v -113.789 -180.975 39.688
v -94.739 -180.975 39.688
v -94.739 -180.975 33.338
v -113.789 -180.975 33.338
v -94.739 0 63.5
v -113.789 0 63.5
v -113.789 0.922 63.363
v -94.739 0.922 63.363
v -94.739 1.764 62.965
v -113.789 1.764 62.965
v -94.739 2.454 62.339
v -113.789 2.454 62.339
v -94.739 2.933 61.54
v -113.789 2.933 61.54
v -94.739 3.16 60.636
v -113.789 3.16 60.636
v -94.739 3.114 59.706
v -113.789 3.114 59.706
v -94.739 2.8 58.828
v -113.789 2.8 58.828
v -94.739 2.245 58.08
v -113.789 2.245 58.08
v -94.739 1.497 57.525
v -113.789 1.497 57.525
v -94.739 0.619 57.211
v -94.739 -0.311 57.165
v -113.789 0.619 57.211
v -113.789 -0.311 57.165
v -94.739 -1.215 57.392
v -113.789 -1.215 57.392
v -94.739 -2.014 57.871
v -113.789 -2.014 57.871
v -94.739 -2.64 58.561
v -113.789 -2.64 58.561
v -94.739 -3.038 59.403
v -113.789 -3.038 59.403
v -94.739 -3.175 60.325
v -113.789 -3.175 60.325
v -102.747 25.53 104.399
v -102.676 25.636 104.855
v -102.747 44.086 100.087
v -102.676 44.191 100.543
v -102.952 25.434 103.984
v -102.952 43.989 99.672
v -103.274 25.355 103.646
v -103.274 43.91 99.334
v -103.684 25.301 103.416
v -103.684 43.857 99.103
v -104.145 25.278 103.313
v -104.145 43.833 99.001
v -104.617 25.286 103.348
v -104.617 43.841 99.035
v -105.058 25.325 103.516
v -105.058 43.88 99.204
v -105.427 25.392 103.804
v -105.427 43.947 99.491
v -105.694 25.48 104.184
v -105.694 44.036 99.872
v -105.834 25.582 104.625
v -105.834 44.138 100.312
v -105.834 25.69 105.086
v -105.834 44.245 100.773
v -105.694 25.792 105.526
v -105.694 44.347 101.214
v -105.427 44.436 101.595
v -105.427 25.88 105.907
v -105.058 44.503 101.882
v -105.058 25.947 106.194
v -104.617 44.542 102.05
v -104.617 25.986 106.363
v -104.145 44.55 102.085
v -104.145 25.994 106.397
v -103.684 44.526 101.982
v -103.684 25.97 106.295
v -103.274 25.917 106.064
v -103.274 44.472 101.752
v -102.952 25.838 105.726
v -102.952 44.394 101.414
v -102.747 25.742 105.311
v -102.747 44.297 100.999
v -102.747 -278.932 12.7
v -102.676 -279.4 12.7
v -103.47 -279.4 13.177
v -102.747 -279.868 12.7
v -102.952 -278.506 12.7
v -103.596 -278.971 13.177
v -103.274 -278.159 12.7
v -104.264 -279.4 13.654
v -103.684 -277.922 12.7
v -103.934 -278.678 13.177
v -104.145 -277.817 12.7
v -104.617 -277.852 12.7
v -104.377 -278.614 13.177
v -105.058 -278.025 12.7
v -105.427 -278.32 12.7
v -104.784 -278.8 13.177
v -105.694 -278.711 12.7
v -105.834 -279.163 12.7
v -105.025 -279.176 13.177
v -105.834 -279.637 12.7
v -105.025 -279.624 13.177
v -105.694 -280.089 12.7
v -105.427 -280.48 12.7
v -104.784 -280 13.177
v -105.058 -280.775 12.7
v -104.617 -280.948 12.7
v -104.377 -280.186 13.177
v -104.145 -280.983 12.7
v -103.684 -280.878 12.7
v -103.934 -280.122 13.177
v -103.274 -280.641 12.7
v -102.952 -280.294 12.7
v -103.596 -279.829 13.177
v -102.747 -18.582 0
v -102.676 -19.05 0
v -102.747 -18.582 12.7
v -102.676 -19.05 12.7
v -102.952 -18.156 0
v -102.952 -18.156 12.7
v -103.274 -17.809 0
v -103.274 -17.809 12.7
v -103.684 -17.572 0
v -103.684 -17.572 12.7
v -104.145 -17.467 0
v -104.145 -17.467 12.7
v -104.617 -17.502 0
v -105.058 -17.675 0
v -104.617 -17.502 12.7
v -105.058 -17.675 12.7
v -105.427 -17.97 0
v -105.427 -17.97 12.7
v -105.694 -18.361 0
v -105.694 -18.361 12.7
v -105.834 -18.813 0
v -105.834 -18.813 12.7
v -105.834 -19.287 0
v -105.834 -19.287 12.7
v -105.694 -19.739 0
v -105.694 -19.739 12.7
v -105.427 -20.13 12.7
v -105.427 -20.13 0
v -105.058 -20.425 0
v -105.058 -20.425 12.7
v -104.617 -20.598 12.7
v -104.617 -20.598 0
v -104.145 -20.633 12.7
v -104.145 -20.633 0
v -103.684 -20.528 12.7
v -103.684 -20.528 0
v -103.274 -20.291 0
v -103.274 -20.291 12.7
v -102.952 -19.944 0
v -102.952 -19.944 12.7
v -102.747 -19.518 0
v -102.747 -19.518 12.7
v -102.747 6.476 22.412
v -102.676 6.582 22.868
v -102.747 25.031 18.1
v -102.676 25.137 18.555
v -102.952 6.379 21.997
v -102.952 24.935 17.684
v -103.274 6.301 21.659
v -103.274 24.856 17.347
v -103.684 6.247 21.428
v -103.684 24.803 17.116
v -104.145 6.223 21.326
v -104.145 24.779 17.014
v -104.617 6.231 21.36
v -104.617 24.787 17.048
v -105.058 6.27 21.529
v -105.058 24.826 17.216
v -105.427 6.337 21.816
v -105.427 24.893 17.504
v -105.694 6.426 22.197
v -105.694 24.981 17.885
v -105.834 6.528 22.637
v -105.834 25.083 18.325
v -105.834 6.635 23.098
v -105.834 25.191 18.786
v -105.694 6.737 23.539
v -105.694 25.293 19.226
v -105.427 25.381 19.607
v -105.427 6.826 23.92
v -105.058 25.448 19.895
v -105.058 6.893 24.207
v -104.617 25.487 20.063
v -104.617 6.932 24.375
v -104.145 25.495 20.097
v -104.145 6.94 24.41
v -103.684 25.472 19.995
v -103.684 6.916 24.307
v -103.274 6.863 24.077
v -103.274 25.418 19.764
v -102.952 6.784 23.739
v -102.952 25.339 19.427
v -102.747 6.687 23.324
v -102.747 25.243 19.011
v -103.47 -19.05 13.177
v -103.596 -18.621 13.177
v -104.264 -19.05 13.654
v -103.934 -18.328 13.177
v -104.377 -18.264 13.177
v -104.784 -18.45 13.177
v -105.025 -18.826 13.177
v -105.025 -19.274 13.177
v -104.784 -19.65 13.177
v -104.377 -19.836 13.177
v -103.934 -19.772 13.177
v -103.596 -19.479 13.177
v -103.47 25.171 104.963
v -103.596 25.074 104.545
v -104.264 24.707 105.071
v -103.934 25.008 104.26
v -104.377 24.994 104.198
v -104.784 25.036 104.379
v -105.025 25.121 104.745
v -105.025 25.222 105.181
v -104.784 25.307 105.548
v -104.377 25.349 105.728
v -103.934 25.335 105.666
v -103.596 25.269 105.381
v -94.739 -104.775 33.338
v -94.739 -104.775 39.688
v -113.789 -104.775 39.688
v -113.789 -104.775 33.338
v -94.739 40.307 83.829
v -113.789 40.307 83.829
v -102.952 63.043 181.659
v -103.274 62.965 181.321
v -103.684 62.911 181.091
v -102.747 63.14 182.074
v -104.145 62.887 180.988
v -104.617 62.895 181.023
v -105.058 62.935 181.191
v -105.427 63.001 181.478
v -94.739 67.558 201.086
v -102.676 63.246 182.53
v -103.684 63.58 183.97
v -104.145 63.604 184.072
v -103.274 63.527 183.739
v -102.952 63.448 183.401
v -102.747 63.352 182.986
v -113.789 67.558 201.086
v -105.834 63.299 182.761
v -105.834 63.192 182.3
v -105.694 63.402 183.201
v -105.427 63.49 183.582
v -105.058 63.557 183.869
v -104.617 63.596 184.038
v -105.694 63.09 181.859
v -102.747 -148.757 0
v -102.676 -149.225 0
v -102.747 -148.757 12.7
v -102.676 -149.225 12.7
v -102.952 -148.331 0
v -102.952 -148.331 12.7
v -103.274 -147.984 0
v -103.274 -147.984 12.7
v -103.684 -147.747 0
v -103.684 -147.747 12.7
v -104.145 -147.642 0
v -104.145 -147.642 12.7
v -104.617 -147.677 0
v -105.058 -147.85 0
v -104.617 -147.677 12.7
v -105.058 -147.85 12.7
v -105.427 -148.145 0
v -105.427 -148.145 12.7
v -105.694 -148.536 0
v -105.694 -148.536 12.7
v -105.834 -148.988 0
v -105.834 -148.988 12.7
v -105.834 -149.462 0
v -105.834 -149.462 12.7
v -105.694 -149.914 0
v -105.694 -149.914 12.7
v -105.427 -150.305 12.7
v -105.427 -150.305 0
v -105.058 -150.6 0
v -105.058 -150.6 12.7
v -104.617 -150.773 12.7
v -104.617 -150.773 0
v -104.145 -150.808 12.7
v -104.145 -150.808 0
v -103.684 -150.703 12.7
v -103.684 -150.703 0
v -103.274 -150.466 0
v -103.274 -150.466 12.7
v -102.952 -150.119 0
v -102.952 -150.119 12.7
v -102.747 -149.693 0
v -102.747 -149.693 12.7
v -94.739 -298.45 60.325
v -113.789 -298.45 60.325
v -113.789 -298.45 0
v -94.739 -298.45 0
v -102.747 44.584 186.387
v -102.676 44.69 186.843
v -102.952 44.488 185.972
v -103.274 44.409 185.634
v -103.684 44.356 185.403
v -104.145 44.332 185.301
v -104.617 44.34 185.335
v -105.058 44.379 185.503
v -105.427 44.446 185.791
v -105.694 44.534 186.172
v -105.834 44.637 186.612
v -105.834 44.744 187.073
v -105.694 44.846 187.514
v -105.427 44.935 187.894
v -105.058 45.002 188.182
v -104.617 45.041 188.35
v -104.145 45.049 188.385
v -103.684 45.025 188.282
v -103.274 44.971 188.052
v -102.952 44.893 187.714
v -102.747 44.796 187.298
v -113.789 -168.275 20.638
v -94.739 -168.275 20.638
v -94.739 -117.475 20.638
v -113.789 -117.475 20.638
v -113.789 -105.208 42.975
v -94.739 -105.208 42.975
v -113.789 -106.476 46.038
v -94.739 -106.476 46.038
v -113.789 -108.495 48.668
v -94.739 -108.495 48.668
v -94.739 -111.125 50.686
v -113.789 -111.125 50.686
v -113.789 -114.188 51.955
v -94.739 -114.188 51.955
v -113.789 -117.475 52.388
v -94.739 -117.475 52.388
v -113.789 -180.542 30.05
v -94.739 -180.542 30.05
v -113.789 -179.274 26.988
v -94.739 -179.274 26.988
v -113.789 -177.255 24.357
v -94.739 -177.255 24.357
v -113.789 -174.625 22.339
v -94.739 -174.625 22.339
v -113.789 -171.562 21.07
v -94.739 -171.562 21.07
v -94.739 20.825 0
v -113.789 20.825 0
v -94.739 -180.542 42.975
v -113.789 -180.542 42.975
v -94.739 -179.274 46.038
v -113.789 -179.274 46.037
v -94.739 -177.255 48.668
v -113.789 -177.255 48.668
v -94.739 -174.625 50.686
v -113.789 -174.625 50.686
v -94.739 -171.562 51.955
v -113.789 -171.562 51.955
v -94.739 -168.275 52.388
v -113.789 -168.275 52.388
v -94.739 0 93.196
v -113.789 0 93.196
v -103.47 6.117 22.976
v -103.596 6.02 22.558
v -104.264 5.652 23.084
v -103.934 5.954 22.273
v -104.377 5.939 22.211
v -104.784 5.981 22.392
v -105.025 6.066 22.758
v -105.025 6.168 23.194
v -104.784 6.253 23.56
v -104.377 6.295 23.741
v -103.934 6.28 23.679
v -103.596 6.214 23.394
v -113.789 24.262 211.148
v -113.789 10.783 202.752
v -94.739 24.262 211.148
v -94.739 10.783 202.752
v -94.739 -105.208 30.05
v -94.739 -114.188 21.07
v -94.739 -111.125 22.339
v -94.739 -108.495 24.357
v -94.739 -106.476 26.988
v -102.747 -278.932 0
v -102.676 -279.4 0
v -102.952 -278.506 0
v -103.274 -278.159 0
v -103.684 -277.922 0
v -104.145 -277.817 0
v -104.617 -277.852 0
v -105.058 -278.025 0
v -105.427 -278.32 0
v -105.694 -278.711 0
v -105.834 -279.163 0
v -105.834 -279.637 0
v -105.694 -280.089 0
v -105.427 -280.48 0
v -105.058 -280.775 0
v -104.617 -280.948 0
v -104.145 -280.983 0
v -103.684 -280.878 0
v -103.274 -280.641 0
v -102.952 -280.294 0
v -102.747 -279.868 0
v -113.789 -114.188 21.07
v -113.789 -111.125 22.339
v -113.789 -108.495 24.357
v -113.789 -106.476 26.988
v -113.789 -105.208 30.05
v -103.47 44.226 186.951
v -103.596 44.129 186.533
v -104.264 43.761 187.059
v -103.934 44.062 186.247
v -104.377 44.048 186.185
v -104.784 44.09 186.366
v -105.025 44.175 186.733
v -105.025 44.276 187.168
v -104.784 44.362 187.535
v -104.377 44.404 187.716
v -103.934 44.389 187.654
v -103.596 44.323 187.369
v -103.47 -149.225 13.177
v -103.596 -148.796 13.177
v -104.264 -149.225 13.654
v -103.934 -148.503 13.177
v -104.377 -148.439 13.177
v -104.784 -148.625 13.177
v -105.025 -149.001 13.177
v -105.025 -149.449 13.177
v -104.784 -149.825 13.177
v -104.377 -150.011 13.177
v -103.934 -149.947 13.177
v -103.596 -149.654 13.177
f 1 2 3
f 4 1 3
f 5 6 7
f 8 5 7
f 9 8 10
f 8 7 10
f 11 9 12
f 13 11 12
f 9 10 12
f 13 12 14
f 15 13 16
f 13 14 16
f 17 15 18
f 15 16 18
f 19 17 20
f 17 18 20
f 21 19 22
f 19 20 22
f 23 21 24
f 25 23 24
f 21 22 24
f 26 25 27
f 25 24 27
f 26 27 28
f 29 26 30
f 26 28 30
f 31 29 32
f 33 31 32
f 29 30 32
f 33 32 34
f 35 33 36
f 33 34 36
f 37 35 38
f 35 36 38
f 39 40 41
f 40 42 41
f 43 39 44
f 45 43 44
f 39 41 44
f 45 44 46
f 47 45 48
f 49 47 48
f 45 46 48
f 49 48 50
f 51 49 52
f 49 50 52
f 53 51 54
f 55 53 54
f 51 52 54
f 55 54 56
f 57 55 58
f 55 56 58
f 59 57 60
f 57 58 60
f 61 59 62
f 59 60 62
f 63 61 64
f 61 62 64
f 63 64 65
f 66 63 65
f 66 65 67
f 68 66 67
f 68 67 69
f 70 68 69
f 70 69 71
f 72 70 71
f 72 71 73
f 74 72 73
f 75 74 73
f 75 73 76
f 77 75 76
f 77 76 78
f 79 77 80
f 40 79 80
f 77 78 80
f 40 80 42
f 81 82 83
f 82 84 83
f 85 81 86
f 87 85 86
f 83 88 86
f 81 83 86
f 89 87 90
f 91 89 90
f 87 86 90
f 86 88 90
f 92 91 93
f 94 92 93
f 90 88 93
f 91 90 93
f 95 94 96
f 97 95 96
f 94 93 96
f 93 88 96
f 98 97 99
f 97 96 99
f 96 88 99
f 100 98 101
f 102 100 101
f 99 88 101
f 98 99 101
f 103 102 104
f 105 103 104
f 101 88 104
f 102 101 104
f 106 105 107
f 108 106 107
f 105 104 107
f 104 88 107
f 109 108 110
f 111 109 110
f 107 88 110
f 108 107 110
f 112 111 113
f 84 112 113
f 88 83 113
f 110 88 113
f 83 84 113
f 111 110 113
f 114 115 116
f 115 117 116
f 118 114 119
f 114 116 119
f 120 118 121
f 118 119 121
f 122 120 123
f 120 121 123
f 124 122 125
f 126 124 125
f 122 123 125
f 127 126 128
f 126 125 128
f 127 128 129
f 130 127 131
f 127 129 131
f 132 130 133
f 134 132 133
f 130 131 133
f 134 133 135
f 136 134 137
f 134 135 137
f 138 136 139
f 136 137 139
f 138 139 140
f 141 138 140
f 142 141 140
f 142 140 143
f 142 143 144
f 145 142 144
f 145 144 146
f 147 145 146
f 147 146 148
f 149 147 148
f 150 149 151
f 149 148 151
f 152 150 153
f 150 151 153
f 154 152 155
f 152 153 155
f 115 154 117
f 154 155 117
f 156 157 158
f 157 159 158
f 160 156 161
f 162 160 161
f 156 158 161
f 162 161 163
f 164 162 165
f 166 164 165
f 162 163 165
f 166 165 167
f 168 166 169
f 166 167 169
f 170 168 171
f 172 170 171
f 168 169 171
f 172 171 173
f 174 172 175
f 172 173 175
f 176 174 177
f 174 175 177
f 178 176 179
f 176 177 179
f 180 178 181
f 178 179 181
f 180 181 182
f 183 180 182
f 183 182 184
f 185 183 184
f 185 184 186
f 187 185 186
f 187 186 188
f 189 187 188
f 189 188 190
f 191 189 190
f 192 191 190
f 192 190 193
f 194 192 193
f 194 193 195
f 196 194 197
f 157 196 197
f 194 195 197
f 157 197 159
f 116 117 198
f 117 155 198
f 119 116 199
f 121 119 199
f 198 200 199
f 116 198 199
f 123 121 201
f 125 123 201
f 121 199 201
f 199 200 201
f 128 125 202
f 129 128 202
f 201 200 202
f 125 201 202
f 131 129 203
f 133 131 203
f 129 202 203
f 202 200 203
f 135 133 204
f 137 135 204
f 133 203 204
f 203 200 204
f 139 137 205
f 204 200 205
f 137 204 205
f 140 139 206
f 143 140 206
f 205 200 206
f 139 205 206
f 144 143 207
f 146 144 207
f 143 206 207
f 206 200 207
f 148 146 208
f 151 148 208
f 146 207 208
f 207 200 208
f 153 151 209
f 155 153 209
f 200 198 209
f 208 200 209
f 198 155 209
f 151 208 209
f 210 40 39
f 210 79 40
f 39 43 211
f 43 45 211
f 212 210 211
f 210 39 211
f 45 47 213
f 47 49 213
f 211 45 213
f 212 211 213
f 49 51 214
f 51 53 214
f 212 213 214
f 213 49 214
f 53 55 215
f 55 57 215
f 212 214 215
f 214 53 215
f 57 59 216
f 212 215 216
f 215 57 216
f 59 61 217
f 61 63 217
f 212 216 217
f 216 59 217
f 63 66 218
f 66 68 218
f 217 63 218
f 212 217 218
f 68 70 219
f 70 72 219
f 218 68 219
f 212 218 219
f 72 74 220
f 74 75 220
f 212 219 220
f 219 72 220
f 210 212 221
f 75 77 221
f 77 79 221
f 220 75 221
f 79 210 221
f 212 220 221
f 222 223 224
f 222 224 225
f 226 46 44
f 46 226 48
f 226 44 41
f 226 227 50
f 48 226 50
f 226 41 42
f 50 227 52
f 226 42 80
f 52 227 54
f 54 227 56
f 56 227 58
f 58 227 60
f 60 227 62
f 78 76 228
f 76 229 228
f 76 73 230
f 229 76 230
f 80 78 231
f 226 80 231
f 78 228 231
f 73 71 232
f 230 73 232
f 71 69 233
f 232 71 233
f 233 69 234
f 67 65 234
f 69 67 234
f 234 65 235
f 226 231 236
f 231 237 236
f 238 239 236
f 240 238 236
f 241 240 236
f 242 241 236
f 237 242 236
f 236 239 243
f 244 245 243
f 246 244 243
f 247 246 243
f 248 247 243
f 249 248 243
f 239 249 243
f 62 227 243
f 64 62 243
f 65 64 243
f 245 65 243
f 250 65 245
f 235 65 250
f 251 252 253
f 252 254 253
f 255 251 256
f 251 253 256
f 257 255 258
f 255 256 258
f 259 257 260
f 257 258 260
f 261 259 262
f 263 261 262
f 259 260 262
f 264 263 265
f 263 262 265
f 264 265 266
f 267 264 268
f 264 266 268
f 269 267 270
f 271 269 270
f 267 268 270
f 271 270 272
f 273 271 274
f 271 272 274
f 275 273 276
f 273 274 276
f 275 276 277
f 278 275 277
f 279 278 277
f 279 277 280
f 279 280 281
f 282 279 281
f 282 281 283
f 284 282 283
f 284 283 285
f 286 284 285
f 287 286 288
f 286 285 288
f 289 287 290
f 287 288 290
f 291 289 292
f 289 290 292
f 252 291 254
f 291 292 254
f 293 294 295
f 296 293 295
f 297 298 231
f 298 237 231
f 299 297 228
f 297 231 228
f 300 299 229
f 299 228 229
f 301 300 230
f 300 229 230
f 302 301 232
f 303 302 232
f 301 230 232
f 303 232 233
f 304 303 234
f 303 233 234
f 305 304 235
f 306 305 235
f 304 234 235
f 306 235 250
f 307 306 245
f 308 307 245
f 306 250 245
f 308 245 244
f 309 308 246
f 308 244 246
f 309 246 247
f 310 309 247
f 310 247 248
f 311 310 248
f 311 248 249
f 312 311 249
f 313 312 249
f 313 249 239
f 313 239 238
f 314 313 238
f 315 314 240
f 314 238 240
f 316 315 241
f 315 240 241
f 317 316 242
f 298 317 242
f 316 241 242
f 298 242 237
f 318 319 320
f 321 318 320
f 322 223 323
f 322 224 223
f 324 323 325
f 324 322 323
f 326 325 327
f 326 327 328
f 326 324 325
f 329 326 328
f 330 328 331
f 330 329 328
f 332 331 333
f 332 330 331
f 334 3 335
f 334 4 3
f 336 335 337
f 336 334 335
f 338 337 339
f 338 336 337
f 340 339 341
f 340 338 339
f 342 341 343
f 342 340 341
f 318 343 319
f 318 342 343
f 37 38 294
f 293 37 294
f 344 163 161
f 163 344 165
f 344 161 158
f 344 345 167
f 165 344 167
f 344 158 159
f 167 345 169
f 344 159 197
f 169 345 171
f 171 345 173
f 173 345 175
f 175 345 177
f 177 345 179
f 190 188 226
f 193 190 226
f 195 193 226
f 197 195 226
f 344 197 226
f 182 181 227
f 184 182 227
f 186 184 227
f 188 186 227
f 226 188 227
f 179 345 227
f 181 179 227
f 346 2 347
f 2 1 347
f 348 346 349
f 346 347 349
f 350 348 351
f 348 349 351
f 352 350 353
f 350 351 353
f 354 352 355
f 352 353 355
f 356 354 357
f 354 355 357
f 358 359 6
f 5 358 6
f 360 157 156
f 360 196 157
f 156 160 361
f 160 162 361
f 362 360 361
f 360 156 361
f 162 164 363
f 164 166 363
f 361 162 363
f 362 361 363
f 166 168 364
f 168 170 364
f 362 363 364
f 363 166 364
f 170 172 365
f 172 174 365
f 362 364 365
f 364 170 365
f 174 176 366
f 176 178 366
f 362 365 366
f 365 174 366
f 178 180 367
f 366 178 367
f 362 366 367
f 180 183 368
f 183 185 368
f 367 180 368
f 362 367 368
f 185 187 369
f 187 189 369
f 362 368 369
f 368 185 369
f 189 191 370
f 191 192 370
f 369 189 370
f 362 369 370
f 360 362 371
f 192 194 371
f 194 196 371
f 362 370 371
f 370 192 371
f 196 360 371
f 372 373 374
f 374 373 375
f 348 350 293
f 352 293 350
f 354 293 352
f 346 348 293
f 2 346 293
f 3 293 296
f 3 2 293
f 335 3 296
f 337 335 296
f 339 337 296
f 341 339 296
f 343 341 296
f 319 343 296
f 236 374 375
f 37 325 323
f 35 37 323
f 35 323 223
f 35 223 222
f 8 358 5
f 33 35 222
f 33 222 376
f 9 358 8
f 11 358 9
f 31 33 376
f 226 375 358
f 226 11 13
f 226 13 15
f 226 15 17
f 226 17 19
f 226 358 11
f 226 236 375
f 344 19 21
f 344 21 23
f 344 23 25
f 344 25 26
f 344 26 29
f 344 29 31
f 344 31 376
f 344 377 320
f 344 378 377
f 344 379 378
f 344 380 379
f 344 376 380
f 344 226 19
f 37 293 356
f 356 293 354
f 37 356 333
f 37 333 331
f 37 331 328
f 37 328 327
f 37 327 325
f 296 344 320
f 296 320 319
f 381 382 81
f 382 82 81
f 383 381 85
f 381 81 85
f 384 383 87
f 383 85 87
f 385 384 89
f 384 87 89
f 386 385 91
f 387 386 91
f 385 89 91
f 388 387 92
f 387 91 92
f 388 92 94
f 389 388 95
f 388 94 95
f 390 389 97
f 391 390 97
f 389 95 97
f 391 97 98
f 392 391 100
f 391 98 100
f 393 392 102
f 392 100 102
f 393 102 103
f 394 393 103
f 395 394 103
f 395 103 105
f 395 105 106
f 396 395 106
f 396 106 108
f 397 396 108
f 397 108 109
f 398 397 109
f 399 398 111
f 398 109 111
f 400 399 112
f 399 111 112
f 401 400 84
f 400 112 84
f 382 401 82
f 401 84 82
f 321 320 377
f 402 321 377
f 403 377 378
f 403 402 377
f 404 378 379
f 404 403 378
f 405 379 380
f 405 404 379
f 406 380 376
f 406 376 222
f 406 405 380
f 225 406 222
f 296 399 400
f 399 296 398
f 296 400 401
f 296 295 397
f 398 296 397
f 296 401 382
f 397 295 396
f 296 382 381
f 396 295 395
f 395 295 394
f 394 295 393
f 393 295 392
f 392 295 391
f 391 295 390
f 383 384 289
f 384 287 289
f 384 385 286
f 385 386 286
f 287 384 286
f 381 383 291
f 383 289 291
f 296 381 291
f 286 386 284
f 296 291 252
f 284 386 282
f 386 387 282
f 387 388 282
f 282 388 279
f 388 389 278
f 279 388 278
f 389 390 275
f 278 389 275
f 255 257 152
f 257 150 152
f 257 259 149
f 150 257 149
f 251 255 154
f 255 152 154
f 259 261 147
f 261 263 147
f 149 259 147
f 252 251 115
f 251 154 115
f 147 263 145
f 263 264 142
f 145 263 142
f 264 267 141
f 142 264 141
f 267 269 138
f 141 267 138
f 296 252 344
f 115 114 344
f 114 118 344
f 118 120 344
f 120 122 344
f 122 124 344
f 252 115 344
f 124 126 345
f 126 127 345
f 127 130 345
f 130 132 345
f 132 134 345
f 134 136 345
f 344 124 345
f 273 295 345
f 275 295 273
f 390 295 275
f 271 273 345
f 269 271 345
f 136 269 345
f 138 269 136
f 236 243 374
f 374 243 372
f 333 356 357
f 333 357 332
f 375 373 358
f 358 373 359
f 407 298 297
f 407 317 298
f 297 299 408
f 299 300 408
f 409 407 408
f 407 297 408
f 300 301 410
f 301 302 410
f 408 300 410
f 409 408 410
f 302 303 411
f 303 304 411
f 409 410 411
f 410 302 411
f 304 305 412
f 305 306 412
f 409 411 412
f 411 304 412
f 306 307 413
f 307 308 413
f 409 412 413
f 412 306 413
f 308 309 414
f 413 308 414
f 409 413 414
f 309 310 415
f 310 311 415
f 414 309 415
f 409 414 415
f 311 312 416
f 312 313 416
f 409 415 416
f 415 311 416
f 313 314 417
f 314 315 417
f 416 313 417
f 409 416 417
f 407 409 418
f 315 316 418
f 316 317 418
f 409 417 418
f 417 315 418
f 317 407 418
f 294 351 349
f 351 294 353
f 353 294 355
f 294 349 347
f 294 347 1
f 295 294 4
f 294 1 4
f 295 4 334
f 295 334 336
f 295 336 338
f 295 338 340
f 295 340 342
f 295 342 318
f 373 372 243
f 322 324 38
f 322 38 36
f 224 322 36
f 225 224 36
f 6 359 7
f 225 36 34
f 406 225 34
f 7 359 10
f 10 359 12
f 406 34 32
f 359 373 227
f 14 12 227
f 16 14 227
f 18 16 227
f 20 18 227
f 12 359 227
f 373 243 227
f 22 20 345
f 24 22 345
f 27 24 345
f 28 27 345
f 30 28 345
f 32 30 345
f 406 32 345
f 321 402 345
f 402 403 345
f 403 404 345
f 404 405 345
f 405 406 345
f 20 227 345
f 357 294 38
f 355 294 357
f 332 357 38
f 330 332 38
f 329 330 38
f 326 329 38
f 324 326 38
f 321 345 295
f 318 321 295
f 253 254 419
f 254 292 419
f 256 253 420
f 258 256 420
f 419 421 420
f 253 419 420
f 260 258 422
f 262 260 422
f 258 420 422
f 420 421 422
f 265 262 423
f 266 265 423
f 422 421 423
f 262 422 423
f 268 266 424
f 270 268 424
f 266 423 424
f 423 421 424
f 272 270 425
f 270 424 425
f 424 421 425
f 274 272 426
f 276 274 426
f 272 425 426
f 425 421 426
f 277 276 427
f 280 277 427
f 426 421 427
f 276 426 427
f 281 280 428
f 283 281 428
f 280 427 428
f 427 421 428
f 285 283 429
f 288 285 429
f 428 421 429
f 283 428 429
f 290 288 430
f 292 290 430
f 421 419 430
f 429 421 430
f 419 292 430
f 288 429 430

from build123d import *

# Parameters (mm, degrees)
BOSS_EXTRUDE1_DEPTH = 19.05
BOSS_EXTRUDE2_DEPTH = 19.05
CHAMFER1_SIZE       = 12.7
CHAMFER1_SIZE2      = 11.325028866
SKETCH12_W          = 31.75
SKETCH12_H          = 76.2
CUT_EXTRUDE1_DEPTH  = 367.085742005
FILLET1_R           = 12.7


# Read off the part's stored shape, not the designer's step: Hole3, Hole4
with BuildPart() as part:
    # Sketch2 → Boss-Extrude1 (new body)
    with BuildSketch(Plane(origin=(-113.788766336, 0, 0), x_dir=(0, 0, -1), z_dir=(1, 0, 0))):
        with BuildLine():
            Line((0, 20.824633003), (-83.828599938, 40.306941911))
            Line((-83.828599938, 40.306941911), (-93.196193981, 0))
            Line((-93.196193981, 0), (-63.5, 0))
            ThreePointArc((-63.5, 0), (-58.07993597, 2.24506403), (-60.325, -3.175))
            Line((-60.325, -3.175), (-60.325, -298.45))
            Line((-60.325, -298.45), (0, -298.45))
            Line((0, -298.45), (0, 20.824633003))
        make_face()
    extrude(amount=BOSS_EXTRUDE1_DEPTH)

    # Sketch3 → Boss-Extrude2 (add, through all)
    with BuildSketch(Plane.ZY.offset(113.788766336)):
        Polygon((83.828599938, 40.306941911), (201.08567571, 67.558244849), (214.022912031, 11.891823944), (93.196193981, 0), align=None)
    extrude(amount=-BOSS_EXTRUDE2_DEPTH)

    # Chamfer1
    chamfer1_edges = [part.edges().sort_by_distance(p)[0] for p in [
        (-104.263766336, 11.891823944, 214.022912031),
    ]]
    chamfer1_side = [part.faces().sort_by_distance(p)[0] for p in [
        (-104.263766336, 39.725034397, 207.554293871),
    ]]
    chamfer(chamfer1_edges, length=CHAMFER1_SIZE, length2=CHAMFER1_SIZE2, reference=chamfer1_side[0])

    # Hole3 outline → Hole3 (revolve, cut)
    with BuildSketch(Plane(origin=(-104.263766336, 5.379568105, 23.147239101), x_dir=(1, 0, 0), z_dir=(0, 0.22637333895091205, 0.9740406107612842))):
        Polygon((0, 0.280172016), (1.5875, 1.234038249), (1.5875, 20.284038249), (0, 20.284038249), align=None)
    revolve(axis=Axis((-104.263766336, 5.379568105, 23.147239101), (0, 0.9740406107612842, -0.22637333895091205)), mode=Mode.SUBTRACT)

    # Hole3 2 outline → Hole3 2 (revolve, cut)
    with BuildSketch(Plane(origin=(-104.263766336, 24.433961921, 105.134603321), x_dir=(1, 0, 0), z_dir=(0, 0.22637333895091205, 0.9740406107612842))):
        Polygon((0, 0.280172016), (1.5875, 1.234038249), (1.5875, 20.284038249), (0, 20.284038249), align=None)
    revolve(axis=Axis((-104.263766336, 24.433961921, 105.134603321), (0, 0.9740406107612842, -0.22637333895091205)), mode=Mode.SUBTRACT)

    # Hole3 3 outline → Hole3 3 (revolve, cut)
    with BuildSketch(Plane(origin=(-104.263766336, 43.488355737, 187.121967541), x_dir=(1, 0, 0), z_dir=(0, 0.22637333895091205, 0.9740406107612842))):
        Polygon((0, 0.280172016), (1.5875, 1.234038249), (1.5875, 20.284038249), (0, 20.284038249), align=None)
    revolve(axis=Axis((-104.263766336, 43.488355737, 187.121967541), (0, 0.9740406107612842, -0.22637333895091205)), mode=Mode.SUBTRACT)

    # Hole4 outline → Hole4 (revolve, cut)
    with BuildSketch(Plane(origin=(-104.263766336, -279.4, 0), x_dir=(1, 0, 0), z_dir=(0, -1, 0))):
        Polygon((1.5875, 0), (1.5875, 12.7), (0, 13.653866233), (0, 0), align=None)
    revolve(axis=Axis((-104.263766336, -279.4, 0), (0, 0, 1)), mode=Mode.SUBTRACT)

    # Hole4 2 outline → Hole4 2 (revolve, cut)
    with BuildSketch(Plane(origin=(-104.263766336, -149.225, 0), x_dir=(1, 0, 0), z_dir=(0, -1, 0))):
        Polygon((1.5875, 0), (1.5875, 12.7), (0, 13.653866233), (0, 0), align=None)
    revolve(axis=Axis((-104.263766336, -149.225, 0), (0, 0, 1)), mode=Mode.SUBTRACT)

    # Hole4 3 outline → Hole4 3 (revolve, cut)
    with BuildSketch(Plane(origin=(-104.263766336, -19.05, 0), x_dir=(1, 0, 0), z_dir=(0, -1, 0))):
        Polygon((1.5875, 0), (1.5875, 12.7), (0, 13.653866233), (0, 0), align=None)
    revolve(axis=Axis((-104.263766336, -19.05, 0), (0, 0, 1)), mode=Mode.SUBTRACT)

    # Sketch12 → Cut-Extrude1 (cut, through all)
    with BuildSketch(Plane(origin=(-94.738766336, 0, 0), x_dir=(0, 0, -1), z_dir=(1, 0, 0))):
        with Locations((-36.5125, -142.875)):
            Rectangle(SKETCH12_W, SKETCH12_H)
    extrude(amount=-CUT_EXTRUDE1_DEPTH, mode=Mode.SUBTRACT)

    # Fillet1
    fillet1_edges = [part.edges().sort_by_distance(p)[0] for p in [
        (-104.263766336, -104.775, 20.6375),
        (-104.263766336, -180.975, 20.6375),
        (-104.263766336, -180.975, 52.3875),
        (-104.263766336, -104.775, 52.3875),
    ]]
    fillet(fillet1_edges, radius=FILLET1_R)


solid = part.part
